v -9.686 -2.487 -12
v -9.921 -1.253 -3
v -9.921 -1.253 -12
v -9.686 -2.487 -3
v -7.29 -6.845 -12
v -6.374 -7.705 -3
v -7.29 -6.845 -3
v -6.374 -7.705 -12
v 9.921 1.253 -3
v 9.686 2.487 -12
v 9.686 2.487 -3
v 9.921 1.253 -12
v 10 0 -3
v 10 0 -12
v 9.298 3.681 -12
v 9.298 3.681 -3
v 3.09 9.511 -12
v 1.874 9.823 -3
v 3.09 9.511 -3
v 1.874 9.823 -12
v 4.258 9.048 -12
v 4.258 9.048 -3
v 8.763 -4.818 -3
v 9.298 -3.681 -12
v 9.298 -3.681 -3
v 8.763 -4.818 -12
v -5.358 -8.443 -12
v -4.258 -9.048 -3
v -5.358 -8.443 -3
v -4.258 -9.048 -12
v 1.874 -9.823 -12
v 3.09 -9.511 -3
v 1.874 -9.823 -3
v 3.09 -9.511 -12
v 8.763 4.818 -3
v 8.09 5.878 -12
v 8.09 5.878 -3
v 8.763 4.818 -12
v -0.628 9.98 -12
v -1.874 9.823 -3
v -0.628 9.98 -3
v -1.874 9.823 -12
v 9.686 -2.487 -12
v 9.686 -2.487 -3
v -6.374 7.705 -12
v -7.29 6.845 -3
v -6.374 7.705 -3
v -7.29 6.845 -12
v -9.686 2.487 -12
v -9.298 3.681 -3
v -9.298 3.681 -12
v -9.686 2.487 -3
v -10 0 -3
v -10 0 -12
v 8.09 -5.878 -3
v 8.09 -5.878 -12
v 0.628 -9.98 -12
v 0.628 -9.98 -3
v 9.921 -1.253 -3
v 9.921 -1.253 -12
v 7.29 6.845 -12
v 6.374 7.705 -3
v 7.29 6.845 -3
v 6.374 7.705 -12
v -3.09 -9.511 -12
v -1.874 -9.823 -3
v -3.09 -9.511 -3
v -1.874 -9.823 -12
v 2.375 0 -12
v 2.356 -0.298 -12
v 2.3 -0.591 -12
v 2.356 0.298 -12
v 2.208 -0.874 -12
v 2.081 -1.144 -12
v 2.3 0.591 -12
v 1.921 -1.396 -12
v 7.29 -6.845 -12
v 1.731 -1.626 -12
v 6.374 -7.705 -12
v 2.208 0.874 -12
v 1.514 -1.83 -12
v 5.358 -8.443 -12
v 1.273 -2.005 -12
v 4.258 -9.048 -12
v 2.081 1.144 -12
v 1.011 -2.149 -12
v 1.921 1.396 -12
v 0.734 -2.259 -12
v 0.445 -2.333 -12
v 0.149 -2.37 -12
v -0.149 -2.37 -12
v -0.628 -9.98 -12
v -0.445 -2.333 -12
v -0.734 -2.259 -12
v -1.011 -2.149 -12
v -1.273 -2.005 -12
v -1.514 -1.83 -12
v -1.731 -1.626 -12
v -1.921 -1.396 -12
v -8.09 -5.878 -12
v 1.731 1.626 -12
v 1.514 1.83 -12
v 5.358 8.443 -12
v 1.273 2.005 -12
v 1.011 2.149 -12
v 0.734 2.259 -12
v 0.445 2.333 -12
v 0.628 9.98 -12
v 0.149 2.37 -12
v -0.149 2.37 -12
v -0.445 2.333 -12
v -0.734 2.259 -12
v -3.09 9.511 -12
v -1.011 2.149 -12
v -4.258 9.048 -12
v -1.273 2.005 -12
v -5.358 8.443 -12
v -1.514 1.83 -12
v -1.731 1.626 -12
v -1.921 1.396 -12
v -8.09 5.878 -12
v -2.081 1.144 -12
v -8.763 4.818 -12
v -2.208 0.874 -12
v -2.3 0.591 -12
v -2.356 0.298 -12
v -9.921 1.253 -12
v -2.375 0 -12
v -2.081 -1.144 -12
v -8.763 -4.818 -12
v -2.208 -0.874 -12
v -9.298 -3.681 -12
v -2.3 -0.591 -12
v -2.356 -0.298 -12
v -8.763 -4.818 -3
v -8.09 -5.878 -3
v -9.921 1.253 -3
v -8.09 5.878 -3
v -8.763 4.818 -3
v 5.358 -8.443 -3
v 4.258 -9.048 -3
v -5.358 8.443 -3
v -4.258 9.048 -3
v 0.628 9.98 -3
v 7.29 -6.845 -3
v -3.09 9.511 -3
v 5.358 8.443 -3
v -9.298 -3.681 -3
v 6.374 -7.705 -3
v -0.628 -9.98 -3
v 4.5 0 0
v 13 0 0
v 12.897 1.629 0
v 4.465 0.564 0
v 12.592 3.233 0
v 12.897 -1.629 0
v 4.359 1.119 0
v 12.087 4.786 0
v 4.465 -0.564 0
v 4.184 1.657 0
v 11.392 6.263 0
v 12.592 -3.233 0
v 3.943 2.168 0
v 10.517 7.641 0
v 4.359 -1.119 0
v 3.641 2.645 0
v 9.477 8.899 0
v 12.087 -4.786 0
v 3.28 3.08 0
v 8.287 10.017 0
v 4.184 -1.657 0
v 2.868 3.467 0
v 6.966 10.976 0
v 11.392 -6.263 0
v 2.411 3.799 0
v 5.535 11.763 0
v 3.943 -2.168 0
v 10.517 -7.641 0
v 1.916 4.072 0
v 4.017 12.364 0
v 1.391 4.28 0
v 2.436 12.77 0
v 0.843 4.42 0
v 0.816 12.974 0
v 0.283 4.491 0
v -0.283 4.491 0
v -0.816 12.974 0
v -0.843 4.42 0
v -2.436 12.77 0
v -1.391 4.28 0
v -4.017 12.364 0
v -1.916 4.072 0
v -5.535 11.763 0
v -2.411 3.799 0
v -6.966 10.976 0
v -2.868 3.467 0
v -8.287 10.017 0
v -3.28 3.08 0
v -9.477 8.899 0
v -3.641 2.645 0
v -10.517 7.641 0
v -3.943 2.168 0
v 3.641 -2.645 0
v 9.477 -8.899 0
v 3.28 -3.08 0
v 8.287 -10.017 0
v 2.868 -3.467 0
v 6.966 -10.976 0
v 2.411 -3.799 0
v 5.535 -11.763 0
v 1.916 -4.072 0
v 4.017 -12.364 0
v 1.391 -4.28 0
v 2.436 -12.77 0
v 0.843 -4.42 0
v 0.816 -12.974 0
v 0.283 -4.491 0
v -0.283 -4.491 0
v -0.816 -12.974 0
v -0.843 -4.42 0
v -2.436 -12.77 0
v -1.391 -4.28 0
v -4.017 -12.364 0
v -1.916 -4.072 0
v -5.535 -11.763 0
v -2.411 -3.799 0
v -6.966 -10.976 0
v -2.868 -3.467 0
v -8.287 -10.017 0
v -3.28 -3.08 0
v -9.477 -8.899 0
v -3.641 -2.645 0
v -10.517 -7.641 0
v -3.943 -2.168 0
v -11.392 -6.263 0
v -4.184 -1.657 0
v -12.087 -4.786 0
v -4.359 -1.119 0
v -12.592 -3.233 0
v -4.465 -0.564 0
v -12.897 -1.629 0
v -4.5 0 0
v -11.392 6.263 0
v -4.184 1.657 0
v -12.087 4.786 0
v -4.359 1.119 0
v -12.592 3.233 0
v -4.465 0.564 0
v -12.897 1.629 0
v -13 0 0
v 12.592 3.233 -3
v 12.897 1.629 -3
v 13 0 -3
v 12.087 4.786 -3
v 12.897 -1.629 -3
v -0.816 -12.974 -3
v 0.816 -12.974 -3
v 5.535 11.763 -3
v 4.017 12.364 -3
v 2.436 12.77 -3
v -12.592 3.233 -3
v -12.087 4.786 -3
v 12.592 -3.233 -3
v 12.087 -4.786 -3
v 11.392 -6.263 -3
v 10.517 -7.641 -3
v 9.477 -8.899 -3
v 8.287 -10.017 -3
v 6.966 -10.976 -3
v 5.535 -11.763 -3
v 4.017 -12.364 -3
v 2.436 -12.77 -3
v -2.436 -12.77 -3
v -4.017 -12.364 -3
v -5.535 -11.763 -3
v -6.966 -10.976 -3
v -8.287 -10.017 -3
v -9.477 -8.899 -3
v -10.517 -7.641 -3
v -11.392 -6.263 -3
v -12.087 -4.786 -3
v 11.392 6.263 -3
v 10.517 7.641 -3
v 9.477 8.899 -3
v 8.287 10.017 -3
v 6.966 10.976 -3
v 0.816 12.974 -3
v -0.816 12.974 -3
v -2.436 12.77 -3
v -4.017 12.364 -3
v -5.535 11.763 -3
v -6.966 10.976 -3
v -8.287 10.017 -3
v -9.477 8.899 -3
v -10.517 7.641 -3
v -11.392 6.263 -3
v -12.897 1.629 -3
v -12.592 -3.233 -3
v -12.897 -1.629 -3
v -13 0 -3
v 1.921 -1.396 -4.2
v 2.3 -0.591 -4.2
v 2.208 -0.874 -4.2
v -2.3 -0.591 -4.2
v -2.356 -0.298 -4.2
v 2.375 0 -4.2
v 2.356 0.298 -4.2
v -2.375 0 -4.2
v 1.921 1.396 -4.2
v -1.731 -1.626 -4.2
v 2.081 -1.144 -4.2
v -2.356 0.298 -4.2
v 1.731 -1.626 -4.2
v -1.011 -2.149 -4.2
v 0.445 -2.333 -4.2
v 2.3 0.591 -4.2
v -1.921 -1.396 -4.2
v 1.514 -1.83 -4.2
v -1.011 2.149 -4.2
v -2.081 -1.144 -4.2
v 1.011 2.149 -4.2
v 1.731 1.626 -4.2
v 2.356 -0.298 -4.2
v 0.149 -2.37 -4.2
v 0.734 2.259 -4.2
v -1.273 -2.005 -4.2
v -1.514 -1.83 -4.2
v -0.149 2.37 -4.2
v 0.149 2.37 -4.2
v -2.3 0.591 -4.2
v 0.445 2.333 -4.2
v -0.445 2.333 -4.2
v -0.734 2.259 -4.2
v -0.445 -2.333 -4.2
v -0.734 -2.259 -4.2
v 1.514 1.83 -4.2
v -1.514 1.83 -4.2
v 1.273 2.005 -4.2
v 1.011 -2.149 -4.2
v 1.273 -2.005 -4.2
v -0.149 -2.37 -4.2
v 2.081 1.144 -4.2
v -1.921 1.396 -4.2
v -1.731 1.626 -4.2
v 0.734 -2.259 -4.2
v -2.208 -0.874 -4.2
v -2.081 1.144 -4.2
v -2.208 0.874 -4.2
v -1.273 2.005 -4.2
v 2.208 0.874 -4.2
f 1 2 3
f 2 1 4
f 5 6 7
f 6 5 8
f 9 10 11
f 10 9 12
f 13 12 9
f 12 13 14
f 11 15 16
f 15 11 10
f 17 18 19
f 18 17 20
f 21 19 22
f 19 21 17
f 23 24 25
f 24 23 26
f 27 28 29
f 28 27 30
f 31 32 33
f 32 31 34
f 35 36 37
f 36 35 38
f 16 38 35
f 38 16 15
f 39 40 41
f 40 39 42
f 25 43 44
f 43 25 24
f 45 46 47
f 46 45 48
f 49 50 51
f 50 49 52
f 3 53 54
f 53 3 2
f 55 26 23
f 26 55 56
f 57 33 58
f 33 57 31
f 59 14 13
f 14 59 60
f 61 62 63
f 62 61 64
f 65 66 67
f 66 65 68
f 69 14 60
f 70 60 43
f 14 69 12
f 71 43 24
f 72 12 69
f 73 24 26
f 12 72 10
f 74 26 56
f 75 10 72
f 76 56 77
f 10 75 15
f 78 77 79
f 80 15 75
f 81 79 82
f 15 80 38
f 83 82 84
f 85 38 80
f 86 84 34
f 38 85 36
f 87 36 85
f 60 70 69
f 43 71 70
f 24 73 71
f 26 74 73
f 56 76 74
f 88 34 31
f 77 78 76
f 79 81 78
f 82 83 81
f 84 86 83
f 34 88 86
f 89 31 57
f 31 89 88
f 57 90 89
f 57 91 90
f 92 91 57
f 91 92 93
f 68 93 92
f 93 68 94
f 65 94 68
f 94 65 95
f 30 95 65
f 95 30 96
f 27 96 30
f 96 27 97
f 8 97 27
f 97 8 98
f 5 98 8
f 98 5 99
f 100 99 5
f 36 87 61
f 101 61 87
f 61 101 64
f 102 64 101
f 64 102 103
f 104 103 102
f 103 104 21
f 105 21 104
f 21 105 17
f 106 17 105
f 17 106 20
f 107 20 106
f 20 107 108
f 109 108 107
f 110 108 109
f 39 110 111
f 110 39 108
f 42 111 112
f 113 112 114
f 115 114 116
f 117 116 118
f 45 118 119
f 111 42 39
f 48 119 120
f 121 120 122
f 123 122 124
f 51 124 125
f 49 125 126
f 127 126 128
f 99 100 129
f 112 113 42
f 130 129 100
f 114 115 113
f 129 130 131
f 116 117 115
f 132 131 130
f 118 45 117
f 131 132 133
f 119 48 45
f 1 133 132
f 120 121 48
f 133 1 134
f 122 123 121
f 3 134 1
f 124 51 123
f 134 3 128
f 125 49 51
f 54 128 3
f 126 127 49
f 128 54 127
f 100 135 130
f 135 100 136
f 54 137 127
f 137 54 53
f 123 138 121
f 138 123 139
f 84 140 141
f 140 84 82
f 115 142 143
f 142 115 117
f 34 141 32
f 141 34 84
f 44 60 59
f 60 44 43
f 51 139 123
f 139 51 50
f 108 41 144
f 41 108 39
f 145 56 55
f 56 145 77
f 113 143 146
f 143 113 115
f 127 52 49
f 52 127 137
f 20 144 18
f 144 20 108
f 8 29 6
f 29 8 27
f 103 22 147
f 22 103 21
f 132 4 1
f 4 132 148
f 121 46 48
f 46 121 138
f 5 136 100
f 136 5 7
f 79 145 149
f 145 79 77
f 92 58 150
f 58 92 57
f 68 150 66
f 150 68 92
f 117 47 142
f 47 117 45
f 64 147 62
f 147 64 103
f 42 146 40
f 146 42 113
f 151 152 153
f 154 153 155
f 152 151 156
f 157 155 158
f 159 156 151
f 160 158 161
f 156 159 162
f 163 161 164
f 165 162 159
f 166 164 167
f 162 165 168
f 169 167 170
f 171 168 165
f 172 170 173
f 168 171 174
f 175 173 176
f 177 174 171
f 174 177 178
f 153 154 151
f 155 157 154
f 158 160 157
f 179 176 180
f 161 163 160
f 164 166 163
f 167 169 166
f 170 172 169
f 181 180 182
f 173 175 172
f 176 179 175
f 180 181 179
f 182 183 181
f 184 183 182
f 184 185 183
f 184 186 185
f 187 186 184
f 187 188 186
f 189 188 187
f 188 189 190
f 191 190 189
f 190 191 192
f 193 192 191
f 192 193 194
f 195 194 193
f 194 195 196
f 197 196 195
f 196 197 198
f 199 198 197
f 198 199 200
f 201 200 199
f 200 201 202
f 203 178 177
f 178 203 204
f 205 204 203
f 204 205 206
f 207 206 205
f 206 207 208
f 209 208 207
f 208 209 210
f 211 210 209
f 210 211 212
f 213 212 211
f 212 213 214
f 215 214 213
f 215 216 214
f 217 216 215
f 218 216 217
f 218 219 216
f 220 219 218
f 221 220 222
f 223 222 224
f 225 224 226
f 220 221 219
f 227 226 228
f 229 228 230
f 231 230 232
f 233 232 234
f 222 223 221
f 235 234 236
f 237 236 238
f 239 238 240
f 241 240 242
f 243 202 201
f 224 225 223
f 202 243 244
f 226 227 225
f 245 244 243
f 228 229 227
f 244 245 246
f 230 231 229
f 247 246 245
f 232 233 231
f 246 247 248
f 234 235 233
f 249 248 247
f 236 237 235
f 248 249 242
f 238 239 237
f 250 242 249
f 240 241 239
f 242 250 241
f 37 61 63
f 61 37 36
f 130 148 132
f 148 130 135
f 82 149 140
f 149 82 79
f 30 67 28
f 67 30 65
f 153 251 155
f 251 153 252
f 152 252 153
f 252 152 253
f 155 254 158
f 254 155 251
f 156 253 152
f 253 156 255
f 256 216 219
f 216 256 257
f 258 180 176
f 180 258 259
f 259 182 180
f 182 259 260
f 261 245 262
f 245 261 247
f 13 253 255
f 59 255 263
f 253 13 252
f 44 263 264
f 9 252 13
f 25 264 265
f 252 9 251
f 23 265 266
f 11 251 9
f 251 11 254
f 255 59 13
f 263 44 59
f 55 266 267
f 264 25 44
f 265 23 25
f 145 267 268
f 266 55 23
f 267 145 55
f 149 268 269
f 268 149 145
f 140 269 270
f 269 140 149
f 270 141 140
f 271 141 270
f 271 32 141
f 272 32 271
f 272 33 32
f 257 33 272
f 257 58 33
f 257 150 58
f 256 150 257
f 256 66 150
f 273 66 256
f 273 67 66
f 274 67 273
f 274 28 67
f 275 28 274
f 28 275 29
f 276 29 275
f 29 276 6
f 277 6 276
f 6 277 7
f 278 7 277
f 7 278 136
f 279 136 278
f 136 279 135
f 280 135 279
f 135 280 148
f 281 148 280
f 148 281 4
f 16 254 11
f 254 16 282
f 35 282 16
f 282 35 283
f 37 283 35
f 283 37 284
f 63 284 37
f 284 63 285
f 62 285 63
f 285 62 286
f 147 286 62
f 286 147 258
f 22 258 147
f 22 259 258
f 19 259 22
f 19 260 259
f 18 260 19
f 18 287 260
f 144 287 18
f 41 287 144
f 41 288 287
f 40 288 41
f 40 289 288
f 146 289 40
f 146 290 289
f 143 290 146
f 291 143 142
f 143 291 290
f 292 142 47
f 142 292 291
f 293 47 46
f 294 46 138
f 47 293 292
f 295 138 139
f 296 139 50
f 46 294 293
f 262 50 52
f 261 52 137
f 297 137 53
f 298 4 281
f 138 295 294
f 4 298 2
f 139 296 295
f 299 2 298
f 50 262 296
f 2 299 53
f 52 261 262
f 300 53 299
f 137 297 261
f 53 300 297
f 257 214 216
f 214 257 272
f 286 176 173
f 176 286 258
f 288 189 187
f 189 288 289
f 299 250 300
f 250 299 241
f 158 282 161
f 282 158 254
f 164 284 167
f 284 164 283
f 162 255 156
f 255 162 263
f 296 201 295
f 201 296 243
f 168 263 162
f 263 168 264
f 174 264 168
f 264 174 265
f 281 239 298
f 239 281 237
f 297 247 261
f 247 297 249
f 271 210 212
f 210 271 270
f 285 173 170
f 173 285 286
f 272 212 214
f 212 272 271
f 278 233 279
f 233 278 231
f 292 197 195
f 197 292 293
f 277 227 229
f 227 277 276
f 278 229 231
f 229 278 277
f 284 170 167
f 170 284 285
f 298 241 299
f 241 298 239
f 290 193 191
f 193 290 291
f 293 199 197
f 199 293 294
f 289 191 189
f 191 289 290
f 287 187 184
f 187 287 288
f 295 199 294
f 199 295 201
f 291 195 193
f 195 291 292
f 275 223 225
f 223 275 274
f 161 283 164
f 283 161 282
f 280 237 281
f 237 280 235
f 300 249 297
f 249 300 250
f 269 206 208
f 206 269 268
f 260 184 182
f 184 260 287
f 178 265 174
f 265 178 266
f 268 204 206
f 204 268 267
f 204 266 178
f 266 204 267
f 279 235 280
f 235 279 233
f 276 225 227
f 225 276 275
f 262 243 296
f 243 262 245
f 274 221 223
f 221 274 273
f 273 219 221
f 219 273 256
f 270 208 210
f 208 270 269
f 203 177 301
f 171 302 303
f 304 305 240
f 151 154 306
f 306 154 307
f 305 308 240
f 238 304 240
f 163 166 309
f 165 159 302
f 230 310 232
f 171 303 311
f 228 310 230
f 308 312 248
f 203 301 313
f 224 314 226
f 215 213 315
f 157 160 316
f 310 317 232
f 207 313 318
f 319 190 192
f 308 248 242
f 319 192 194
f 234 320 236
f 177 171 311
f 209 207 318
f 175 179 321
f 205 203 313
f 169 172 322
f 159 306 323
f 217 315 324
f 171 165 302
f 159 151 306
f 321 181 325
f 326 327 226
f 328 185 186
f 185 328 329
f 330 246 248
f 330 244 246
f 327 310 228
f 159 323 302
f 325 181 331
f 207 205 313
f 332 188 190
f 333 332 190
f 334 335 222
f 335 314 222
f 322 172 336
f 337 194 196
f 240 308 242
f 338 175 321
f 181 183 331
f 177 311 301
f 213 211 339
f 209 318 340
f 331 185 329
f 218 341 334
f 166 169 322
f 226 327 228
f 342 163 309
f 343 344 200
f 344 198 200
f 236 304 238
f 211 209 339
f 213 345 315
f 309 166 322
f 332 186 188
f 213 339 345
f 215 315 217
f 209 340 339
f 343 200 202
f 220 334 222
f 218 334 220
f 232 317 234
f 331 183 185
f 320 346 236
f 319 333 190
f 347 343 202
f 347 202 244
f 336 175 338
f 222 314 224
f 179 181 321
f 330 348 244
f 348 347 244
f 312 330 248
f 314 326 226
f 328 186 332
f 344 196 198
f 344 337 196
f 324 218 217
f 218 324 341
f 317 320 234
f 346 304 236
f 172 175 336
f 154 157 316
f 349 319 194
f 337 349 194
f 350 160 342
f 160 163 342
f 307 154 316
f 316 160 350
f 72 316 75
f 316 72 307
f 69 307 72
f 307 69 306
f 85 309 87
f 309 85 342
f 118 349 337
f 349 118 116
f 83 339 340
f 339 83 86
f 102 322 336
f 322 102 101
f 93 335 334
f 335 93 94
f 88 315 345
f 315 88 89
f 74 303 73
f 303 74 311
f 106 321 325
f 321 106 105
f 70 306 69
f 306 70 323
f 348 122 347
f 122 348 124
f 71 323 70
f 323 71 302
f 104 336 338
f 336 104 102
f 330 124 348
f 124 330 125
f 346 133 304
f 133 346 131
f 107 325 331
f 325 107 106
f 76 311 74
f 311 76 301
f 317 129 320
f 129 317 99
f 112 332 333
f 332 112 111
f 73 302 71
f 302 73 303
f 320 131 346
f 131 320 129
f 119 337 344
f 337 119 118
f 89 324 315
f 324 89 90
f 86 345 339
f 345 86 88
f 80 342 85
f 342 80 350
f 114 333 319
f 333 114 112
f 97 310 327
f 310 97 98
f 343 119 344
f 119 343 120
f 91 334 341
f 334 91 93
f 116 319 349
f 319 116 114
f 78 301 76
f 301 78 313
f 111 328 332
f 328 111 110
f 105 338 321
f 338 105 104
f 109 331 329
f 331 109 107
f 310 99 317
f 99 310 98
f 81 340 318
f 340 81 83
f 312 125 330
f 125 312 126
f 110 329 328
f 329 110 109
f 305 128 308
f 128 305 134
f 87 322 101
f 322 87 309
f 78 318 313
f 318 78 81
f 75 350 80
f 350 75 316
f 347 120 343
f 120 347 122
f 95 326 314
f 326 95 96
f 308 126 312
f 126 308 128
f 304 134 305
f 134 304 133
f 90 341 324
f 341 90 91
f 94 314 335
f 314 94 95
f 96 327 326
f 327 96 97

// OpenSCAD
$fn = 50;


difference() {
	union() {
		translate(v = [0, 0, -12.0000000000]) {
			cylinder(h = 12, r = 10.0000000000);
		}
		translate(v = [0, 0, -3.0000000000]) {
			cylinder(h = 3, r = 13.0000000000);
		}
	}
	union() {
		translate(v = [0, 0, 0]) {
			rotate(a = [0, 0, 0]) {
				difference() {
					union() {
						#translate(v = [0, 0, -12.0000000000]) {
							cylinder(h = 12, r = 2.2500000000);
						}
						#translate(v = [0, 0, -4.2000000000]) {
							cylinder(h = 4.2000000000, r1 = 2.3750000000, r2 = 4.5000000000);
						}
						#translate(v = [0, 0, -12.0000000000]) {
							cylinder(h = 12, r = 2.3750000000);
						}
						#translate(v = [0, 0, -12.0000000000]) {
							cylinder(h = 12, r = 2.2500000000);
						}
					}
					union();
				}
			}
		}
	}
}
